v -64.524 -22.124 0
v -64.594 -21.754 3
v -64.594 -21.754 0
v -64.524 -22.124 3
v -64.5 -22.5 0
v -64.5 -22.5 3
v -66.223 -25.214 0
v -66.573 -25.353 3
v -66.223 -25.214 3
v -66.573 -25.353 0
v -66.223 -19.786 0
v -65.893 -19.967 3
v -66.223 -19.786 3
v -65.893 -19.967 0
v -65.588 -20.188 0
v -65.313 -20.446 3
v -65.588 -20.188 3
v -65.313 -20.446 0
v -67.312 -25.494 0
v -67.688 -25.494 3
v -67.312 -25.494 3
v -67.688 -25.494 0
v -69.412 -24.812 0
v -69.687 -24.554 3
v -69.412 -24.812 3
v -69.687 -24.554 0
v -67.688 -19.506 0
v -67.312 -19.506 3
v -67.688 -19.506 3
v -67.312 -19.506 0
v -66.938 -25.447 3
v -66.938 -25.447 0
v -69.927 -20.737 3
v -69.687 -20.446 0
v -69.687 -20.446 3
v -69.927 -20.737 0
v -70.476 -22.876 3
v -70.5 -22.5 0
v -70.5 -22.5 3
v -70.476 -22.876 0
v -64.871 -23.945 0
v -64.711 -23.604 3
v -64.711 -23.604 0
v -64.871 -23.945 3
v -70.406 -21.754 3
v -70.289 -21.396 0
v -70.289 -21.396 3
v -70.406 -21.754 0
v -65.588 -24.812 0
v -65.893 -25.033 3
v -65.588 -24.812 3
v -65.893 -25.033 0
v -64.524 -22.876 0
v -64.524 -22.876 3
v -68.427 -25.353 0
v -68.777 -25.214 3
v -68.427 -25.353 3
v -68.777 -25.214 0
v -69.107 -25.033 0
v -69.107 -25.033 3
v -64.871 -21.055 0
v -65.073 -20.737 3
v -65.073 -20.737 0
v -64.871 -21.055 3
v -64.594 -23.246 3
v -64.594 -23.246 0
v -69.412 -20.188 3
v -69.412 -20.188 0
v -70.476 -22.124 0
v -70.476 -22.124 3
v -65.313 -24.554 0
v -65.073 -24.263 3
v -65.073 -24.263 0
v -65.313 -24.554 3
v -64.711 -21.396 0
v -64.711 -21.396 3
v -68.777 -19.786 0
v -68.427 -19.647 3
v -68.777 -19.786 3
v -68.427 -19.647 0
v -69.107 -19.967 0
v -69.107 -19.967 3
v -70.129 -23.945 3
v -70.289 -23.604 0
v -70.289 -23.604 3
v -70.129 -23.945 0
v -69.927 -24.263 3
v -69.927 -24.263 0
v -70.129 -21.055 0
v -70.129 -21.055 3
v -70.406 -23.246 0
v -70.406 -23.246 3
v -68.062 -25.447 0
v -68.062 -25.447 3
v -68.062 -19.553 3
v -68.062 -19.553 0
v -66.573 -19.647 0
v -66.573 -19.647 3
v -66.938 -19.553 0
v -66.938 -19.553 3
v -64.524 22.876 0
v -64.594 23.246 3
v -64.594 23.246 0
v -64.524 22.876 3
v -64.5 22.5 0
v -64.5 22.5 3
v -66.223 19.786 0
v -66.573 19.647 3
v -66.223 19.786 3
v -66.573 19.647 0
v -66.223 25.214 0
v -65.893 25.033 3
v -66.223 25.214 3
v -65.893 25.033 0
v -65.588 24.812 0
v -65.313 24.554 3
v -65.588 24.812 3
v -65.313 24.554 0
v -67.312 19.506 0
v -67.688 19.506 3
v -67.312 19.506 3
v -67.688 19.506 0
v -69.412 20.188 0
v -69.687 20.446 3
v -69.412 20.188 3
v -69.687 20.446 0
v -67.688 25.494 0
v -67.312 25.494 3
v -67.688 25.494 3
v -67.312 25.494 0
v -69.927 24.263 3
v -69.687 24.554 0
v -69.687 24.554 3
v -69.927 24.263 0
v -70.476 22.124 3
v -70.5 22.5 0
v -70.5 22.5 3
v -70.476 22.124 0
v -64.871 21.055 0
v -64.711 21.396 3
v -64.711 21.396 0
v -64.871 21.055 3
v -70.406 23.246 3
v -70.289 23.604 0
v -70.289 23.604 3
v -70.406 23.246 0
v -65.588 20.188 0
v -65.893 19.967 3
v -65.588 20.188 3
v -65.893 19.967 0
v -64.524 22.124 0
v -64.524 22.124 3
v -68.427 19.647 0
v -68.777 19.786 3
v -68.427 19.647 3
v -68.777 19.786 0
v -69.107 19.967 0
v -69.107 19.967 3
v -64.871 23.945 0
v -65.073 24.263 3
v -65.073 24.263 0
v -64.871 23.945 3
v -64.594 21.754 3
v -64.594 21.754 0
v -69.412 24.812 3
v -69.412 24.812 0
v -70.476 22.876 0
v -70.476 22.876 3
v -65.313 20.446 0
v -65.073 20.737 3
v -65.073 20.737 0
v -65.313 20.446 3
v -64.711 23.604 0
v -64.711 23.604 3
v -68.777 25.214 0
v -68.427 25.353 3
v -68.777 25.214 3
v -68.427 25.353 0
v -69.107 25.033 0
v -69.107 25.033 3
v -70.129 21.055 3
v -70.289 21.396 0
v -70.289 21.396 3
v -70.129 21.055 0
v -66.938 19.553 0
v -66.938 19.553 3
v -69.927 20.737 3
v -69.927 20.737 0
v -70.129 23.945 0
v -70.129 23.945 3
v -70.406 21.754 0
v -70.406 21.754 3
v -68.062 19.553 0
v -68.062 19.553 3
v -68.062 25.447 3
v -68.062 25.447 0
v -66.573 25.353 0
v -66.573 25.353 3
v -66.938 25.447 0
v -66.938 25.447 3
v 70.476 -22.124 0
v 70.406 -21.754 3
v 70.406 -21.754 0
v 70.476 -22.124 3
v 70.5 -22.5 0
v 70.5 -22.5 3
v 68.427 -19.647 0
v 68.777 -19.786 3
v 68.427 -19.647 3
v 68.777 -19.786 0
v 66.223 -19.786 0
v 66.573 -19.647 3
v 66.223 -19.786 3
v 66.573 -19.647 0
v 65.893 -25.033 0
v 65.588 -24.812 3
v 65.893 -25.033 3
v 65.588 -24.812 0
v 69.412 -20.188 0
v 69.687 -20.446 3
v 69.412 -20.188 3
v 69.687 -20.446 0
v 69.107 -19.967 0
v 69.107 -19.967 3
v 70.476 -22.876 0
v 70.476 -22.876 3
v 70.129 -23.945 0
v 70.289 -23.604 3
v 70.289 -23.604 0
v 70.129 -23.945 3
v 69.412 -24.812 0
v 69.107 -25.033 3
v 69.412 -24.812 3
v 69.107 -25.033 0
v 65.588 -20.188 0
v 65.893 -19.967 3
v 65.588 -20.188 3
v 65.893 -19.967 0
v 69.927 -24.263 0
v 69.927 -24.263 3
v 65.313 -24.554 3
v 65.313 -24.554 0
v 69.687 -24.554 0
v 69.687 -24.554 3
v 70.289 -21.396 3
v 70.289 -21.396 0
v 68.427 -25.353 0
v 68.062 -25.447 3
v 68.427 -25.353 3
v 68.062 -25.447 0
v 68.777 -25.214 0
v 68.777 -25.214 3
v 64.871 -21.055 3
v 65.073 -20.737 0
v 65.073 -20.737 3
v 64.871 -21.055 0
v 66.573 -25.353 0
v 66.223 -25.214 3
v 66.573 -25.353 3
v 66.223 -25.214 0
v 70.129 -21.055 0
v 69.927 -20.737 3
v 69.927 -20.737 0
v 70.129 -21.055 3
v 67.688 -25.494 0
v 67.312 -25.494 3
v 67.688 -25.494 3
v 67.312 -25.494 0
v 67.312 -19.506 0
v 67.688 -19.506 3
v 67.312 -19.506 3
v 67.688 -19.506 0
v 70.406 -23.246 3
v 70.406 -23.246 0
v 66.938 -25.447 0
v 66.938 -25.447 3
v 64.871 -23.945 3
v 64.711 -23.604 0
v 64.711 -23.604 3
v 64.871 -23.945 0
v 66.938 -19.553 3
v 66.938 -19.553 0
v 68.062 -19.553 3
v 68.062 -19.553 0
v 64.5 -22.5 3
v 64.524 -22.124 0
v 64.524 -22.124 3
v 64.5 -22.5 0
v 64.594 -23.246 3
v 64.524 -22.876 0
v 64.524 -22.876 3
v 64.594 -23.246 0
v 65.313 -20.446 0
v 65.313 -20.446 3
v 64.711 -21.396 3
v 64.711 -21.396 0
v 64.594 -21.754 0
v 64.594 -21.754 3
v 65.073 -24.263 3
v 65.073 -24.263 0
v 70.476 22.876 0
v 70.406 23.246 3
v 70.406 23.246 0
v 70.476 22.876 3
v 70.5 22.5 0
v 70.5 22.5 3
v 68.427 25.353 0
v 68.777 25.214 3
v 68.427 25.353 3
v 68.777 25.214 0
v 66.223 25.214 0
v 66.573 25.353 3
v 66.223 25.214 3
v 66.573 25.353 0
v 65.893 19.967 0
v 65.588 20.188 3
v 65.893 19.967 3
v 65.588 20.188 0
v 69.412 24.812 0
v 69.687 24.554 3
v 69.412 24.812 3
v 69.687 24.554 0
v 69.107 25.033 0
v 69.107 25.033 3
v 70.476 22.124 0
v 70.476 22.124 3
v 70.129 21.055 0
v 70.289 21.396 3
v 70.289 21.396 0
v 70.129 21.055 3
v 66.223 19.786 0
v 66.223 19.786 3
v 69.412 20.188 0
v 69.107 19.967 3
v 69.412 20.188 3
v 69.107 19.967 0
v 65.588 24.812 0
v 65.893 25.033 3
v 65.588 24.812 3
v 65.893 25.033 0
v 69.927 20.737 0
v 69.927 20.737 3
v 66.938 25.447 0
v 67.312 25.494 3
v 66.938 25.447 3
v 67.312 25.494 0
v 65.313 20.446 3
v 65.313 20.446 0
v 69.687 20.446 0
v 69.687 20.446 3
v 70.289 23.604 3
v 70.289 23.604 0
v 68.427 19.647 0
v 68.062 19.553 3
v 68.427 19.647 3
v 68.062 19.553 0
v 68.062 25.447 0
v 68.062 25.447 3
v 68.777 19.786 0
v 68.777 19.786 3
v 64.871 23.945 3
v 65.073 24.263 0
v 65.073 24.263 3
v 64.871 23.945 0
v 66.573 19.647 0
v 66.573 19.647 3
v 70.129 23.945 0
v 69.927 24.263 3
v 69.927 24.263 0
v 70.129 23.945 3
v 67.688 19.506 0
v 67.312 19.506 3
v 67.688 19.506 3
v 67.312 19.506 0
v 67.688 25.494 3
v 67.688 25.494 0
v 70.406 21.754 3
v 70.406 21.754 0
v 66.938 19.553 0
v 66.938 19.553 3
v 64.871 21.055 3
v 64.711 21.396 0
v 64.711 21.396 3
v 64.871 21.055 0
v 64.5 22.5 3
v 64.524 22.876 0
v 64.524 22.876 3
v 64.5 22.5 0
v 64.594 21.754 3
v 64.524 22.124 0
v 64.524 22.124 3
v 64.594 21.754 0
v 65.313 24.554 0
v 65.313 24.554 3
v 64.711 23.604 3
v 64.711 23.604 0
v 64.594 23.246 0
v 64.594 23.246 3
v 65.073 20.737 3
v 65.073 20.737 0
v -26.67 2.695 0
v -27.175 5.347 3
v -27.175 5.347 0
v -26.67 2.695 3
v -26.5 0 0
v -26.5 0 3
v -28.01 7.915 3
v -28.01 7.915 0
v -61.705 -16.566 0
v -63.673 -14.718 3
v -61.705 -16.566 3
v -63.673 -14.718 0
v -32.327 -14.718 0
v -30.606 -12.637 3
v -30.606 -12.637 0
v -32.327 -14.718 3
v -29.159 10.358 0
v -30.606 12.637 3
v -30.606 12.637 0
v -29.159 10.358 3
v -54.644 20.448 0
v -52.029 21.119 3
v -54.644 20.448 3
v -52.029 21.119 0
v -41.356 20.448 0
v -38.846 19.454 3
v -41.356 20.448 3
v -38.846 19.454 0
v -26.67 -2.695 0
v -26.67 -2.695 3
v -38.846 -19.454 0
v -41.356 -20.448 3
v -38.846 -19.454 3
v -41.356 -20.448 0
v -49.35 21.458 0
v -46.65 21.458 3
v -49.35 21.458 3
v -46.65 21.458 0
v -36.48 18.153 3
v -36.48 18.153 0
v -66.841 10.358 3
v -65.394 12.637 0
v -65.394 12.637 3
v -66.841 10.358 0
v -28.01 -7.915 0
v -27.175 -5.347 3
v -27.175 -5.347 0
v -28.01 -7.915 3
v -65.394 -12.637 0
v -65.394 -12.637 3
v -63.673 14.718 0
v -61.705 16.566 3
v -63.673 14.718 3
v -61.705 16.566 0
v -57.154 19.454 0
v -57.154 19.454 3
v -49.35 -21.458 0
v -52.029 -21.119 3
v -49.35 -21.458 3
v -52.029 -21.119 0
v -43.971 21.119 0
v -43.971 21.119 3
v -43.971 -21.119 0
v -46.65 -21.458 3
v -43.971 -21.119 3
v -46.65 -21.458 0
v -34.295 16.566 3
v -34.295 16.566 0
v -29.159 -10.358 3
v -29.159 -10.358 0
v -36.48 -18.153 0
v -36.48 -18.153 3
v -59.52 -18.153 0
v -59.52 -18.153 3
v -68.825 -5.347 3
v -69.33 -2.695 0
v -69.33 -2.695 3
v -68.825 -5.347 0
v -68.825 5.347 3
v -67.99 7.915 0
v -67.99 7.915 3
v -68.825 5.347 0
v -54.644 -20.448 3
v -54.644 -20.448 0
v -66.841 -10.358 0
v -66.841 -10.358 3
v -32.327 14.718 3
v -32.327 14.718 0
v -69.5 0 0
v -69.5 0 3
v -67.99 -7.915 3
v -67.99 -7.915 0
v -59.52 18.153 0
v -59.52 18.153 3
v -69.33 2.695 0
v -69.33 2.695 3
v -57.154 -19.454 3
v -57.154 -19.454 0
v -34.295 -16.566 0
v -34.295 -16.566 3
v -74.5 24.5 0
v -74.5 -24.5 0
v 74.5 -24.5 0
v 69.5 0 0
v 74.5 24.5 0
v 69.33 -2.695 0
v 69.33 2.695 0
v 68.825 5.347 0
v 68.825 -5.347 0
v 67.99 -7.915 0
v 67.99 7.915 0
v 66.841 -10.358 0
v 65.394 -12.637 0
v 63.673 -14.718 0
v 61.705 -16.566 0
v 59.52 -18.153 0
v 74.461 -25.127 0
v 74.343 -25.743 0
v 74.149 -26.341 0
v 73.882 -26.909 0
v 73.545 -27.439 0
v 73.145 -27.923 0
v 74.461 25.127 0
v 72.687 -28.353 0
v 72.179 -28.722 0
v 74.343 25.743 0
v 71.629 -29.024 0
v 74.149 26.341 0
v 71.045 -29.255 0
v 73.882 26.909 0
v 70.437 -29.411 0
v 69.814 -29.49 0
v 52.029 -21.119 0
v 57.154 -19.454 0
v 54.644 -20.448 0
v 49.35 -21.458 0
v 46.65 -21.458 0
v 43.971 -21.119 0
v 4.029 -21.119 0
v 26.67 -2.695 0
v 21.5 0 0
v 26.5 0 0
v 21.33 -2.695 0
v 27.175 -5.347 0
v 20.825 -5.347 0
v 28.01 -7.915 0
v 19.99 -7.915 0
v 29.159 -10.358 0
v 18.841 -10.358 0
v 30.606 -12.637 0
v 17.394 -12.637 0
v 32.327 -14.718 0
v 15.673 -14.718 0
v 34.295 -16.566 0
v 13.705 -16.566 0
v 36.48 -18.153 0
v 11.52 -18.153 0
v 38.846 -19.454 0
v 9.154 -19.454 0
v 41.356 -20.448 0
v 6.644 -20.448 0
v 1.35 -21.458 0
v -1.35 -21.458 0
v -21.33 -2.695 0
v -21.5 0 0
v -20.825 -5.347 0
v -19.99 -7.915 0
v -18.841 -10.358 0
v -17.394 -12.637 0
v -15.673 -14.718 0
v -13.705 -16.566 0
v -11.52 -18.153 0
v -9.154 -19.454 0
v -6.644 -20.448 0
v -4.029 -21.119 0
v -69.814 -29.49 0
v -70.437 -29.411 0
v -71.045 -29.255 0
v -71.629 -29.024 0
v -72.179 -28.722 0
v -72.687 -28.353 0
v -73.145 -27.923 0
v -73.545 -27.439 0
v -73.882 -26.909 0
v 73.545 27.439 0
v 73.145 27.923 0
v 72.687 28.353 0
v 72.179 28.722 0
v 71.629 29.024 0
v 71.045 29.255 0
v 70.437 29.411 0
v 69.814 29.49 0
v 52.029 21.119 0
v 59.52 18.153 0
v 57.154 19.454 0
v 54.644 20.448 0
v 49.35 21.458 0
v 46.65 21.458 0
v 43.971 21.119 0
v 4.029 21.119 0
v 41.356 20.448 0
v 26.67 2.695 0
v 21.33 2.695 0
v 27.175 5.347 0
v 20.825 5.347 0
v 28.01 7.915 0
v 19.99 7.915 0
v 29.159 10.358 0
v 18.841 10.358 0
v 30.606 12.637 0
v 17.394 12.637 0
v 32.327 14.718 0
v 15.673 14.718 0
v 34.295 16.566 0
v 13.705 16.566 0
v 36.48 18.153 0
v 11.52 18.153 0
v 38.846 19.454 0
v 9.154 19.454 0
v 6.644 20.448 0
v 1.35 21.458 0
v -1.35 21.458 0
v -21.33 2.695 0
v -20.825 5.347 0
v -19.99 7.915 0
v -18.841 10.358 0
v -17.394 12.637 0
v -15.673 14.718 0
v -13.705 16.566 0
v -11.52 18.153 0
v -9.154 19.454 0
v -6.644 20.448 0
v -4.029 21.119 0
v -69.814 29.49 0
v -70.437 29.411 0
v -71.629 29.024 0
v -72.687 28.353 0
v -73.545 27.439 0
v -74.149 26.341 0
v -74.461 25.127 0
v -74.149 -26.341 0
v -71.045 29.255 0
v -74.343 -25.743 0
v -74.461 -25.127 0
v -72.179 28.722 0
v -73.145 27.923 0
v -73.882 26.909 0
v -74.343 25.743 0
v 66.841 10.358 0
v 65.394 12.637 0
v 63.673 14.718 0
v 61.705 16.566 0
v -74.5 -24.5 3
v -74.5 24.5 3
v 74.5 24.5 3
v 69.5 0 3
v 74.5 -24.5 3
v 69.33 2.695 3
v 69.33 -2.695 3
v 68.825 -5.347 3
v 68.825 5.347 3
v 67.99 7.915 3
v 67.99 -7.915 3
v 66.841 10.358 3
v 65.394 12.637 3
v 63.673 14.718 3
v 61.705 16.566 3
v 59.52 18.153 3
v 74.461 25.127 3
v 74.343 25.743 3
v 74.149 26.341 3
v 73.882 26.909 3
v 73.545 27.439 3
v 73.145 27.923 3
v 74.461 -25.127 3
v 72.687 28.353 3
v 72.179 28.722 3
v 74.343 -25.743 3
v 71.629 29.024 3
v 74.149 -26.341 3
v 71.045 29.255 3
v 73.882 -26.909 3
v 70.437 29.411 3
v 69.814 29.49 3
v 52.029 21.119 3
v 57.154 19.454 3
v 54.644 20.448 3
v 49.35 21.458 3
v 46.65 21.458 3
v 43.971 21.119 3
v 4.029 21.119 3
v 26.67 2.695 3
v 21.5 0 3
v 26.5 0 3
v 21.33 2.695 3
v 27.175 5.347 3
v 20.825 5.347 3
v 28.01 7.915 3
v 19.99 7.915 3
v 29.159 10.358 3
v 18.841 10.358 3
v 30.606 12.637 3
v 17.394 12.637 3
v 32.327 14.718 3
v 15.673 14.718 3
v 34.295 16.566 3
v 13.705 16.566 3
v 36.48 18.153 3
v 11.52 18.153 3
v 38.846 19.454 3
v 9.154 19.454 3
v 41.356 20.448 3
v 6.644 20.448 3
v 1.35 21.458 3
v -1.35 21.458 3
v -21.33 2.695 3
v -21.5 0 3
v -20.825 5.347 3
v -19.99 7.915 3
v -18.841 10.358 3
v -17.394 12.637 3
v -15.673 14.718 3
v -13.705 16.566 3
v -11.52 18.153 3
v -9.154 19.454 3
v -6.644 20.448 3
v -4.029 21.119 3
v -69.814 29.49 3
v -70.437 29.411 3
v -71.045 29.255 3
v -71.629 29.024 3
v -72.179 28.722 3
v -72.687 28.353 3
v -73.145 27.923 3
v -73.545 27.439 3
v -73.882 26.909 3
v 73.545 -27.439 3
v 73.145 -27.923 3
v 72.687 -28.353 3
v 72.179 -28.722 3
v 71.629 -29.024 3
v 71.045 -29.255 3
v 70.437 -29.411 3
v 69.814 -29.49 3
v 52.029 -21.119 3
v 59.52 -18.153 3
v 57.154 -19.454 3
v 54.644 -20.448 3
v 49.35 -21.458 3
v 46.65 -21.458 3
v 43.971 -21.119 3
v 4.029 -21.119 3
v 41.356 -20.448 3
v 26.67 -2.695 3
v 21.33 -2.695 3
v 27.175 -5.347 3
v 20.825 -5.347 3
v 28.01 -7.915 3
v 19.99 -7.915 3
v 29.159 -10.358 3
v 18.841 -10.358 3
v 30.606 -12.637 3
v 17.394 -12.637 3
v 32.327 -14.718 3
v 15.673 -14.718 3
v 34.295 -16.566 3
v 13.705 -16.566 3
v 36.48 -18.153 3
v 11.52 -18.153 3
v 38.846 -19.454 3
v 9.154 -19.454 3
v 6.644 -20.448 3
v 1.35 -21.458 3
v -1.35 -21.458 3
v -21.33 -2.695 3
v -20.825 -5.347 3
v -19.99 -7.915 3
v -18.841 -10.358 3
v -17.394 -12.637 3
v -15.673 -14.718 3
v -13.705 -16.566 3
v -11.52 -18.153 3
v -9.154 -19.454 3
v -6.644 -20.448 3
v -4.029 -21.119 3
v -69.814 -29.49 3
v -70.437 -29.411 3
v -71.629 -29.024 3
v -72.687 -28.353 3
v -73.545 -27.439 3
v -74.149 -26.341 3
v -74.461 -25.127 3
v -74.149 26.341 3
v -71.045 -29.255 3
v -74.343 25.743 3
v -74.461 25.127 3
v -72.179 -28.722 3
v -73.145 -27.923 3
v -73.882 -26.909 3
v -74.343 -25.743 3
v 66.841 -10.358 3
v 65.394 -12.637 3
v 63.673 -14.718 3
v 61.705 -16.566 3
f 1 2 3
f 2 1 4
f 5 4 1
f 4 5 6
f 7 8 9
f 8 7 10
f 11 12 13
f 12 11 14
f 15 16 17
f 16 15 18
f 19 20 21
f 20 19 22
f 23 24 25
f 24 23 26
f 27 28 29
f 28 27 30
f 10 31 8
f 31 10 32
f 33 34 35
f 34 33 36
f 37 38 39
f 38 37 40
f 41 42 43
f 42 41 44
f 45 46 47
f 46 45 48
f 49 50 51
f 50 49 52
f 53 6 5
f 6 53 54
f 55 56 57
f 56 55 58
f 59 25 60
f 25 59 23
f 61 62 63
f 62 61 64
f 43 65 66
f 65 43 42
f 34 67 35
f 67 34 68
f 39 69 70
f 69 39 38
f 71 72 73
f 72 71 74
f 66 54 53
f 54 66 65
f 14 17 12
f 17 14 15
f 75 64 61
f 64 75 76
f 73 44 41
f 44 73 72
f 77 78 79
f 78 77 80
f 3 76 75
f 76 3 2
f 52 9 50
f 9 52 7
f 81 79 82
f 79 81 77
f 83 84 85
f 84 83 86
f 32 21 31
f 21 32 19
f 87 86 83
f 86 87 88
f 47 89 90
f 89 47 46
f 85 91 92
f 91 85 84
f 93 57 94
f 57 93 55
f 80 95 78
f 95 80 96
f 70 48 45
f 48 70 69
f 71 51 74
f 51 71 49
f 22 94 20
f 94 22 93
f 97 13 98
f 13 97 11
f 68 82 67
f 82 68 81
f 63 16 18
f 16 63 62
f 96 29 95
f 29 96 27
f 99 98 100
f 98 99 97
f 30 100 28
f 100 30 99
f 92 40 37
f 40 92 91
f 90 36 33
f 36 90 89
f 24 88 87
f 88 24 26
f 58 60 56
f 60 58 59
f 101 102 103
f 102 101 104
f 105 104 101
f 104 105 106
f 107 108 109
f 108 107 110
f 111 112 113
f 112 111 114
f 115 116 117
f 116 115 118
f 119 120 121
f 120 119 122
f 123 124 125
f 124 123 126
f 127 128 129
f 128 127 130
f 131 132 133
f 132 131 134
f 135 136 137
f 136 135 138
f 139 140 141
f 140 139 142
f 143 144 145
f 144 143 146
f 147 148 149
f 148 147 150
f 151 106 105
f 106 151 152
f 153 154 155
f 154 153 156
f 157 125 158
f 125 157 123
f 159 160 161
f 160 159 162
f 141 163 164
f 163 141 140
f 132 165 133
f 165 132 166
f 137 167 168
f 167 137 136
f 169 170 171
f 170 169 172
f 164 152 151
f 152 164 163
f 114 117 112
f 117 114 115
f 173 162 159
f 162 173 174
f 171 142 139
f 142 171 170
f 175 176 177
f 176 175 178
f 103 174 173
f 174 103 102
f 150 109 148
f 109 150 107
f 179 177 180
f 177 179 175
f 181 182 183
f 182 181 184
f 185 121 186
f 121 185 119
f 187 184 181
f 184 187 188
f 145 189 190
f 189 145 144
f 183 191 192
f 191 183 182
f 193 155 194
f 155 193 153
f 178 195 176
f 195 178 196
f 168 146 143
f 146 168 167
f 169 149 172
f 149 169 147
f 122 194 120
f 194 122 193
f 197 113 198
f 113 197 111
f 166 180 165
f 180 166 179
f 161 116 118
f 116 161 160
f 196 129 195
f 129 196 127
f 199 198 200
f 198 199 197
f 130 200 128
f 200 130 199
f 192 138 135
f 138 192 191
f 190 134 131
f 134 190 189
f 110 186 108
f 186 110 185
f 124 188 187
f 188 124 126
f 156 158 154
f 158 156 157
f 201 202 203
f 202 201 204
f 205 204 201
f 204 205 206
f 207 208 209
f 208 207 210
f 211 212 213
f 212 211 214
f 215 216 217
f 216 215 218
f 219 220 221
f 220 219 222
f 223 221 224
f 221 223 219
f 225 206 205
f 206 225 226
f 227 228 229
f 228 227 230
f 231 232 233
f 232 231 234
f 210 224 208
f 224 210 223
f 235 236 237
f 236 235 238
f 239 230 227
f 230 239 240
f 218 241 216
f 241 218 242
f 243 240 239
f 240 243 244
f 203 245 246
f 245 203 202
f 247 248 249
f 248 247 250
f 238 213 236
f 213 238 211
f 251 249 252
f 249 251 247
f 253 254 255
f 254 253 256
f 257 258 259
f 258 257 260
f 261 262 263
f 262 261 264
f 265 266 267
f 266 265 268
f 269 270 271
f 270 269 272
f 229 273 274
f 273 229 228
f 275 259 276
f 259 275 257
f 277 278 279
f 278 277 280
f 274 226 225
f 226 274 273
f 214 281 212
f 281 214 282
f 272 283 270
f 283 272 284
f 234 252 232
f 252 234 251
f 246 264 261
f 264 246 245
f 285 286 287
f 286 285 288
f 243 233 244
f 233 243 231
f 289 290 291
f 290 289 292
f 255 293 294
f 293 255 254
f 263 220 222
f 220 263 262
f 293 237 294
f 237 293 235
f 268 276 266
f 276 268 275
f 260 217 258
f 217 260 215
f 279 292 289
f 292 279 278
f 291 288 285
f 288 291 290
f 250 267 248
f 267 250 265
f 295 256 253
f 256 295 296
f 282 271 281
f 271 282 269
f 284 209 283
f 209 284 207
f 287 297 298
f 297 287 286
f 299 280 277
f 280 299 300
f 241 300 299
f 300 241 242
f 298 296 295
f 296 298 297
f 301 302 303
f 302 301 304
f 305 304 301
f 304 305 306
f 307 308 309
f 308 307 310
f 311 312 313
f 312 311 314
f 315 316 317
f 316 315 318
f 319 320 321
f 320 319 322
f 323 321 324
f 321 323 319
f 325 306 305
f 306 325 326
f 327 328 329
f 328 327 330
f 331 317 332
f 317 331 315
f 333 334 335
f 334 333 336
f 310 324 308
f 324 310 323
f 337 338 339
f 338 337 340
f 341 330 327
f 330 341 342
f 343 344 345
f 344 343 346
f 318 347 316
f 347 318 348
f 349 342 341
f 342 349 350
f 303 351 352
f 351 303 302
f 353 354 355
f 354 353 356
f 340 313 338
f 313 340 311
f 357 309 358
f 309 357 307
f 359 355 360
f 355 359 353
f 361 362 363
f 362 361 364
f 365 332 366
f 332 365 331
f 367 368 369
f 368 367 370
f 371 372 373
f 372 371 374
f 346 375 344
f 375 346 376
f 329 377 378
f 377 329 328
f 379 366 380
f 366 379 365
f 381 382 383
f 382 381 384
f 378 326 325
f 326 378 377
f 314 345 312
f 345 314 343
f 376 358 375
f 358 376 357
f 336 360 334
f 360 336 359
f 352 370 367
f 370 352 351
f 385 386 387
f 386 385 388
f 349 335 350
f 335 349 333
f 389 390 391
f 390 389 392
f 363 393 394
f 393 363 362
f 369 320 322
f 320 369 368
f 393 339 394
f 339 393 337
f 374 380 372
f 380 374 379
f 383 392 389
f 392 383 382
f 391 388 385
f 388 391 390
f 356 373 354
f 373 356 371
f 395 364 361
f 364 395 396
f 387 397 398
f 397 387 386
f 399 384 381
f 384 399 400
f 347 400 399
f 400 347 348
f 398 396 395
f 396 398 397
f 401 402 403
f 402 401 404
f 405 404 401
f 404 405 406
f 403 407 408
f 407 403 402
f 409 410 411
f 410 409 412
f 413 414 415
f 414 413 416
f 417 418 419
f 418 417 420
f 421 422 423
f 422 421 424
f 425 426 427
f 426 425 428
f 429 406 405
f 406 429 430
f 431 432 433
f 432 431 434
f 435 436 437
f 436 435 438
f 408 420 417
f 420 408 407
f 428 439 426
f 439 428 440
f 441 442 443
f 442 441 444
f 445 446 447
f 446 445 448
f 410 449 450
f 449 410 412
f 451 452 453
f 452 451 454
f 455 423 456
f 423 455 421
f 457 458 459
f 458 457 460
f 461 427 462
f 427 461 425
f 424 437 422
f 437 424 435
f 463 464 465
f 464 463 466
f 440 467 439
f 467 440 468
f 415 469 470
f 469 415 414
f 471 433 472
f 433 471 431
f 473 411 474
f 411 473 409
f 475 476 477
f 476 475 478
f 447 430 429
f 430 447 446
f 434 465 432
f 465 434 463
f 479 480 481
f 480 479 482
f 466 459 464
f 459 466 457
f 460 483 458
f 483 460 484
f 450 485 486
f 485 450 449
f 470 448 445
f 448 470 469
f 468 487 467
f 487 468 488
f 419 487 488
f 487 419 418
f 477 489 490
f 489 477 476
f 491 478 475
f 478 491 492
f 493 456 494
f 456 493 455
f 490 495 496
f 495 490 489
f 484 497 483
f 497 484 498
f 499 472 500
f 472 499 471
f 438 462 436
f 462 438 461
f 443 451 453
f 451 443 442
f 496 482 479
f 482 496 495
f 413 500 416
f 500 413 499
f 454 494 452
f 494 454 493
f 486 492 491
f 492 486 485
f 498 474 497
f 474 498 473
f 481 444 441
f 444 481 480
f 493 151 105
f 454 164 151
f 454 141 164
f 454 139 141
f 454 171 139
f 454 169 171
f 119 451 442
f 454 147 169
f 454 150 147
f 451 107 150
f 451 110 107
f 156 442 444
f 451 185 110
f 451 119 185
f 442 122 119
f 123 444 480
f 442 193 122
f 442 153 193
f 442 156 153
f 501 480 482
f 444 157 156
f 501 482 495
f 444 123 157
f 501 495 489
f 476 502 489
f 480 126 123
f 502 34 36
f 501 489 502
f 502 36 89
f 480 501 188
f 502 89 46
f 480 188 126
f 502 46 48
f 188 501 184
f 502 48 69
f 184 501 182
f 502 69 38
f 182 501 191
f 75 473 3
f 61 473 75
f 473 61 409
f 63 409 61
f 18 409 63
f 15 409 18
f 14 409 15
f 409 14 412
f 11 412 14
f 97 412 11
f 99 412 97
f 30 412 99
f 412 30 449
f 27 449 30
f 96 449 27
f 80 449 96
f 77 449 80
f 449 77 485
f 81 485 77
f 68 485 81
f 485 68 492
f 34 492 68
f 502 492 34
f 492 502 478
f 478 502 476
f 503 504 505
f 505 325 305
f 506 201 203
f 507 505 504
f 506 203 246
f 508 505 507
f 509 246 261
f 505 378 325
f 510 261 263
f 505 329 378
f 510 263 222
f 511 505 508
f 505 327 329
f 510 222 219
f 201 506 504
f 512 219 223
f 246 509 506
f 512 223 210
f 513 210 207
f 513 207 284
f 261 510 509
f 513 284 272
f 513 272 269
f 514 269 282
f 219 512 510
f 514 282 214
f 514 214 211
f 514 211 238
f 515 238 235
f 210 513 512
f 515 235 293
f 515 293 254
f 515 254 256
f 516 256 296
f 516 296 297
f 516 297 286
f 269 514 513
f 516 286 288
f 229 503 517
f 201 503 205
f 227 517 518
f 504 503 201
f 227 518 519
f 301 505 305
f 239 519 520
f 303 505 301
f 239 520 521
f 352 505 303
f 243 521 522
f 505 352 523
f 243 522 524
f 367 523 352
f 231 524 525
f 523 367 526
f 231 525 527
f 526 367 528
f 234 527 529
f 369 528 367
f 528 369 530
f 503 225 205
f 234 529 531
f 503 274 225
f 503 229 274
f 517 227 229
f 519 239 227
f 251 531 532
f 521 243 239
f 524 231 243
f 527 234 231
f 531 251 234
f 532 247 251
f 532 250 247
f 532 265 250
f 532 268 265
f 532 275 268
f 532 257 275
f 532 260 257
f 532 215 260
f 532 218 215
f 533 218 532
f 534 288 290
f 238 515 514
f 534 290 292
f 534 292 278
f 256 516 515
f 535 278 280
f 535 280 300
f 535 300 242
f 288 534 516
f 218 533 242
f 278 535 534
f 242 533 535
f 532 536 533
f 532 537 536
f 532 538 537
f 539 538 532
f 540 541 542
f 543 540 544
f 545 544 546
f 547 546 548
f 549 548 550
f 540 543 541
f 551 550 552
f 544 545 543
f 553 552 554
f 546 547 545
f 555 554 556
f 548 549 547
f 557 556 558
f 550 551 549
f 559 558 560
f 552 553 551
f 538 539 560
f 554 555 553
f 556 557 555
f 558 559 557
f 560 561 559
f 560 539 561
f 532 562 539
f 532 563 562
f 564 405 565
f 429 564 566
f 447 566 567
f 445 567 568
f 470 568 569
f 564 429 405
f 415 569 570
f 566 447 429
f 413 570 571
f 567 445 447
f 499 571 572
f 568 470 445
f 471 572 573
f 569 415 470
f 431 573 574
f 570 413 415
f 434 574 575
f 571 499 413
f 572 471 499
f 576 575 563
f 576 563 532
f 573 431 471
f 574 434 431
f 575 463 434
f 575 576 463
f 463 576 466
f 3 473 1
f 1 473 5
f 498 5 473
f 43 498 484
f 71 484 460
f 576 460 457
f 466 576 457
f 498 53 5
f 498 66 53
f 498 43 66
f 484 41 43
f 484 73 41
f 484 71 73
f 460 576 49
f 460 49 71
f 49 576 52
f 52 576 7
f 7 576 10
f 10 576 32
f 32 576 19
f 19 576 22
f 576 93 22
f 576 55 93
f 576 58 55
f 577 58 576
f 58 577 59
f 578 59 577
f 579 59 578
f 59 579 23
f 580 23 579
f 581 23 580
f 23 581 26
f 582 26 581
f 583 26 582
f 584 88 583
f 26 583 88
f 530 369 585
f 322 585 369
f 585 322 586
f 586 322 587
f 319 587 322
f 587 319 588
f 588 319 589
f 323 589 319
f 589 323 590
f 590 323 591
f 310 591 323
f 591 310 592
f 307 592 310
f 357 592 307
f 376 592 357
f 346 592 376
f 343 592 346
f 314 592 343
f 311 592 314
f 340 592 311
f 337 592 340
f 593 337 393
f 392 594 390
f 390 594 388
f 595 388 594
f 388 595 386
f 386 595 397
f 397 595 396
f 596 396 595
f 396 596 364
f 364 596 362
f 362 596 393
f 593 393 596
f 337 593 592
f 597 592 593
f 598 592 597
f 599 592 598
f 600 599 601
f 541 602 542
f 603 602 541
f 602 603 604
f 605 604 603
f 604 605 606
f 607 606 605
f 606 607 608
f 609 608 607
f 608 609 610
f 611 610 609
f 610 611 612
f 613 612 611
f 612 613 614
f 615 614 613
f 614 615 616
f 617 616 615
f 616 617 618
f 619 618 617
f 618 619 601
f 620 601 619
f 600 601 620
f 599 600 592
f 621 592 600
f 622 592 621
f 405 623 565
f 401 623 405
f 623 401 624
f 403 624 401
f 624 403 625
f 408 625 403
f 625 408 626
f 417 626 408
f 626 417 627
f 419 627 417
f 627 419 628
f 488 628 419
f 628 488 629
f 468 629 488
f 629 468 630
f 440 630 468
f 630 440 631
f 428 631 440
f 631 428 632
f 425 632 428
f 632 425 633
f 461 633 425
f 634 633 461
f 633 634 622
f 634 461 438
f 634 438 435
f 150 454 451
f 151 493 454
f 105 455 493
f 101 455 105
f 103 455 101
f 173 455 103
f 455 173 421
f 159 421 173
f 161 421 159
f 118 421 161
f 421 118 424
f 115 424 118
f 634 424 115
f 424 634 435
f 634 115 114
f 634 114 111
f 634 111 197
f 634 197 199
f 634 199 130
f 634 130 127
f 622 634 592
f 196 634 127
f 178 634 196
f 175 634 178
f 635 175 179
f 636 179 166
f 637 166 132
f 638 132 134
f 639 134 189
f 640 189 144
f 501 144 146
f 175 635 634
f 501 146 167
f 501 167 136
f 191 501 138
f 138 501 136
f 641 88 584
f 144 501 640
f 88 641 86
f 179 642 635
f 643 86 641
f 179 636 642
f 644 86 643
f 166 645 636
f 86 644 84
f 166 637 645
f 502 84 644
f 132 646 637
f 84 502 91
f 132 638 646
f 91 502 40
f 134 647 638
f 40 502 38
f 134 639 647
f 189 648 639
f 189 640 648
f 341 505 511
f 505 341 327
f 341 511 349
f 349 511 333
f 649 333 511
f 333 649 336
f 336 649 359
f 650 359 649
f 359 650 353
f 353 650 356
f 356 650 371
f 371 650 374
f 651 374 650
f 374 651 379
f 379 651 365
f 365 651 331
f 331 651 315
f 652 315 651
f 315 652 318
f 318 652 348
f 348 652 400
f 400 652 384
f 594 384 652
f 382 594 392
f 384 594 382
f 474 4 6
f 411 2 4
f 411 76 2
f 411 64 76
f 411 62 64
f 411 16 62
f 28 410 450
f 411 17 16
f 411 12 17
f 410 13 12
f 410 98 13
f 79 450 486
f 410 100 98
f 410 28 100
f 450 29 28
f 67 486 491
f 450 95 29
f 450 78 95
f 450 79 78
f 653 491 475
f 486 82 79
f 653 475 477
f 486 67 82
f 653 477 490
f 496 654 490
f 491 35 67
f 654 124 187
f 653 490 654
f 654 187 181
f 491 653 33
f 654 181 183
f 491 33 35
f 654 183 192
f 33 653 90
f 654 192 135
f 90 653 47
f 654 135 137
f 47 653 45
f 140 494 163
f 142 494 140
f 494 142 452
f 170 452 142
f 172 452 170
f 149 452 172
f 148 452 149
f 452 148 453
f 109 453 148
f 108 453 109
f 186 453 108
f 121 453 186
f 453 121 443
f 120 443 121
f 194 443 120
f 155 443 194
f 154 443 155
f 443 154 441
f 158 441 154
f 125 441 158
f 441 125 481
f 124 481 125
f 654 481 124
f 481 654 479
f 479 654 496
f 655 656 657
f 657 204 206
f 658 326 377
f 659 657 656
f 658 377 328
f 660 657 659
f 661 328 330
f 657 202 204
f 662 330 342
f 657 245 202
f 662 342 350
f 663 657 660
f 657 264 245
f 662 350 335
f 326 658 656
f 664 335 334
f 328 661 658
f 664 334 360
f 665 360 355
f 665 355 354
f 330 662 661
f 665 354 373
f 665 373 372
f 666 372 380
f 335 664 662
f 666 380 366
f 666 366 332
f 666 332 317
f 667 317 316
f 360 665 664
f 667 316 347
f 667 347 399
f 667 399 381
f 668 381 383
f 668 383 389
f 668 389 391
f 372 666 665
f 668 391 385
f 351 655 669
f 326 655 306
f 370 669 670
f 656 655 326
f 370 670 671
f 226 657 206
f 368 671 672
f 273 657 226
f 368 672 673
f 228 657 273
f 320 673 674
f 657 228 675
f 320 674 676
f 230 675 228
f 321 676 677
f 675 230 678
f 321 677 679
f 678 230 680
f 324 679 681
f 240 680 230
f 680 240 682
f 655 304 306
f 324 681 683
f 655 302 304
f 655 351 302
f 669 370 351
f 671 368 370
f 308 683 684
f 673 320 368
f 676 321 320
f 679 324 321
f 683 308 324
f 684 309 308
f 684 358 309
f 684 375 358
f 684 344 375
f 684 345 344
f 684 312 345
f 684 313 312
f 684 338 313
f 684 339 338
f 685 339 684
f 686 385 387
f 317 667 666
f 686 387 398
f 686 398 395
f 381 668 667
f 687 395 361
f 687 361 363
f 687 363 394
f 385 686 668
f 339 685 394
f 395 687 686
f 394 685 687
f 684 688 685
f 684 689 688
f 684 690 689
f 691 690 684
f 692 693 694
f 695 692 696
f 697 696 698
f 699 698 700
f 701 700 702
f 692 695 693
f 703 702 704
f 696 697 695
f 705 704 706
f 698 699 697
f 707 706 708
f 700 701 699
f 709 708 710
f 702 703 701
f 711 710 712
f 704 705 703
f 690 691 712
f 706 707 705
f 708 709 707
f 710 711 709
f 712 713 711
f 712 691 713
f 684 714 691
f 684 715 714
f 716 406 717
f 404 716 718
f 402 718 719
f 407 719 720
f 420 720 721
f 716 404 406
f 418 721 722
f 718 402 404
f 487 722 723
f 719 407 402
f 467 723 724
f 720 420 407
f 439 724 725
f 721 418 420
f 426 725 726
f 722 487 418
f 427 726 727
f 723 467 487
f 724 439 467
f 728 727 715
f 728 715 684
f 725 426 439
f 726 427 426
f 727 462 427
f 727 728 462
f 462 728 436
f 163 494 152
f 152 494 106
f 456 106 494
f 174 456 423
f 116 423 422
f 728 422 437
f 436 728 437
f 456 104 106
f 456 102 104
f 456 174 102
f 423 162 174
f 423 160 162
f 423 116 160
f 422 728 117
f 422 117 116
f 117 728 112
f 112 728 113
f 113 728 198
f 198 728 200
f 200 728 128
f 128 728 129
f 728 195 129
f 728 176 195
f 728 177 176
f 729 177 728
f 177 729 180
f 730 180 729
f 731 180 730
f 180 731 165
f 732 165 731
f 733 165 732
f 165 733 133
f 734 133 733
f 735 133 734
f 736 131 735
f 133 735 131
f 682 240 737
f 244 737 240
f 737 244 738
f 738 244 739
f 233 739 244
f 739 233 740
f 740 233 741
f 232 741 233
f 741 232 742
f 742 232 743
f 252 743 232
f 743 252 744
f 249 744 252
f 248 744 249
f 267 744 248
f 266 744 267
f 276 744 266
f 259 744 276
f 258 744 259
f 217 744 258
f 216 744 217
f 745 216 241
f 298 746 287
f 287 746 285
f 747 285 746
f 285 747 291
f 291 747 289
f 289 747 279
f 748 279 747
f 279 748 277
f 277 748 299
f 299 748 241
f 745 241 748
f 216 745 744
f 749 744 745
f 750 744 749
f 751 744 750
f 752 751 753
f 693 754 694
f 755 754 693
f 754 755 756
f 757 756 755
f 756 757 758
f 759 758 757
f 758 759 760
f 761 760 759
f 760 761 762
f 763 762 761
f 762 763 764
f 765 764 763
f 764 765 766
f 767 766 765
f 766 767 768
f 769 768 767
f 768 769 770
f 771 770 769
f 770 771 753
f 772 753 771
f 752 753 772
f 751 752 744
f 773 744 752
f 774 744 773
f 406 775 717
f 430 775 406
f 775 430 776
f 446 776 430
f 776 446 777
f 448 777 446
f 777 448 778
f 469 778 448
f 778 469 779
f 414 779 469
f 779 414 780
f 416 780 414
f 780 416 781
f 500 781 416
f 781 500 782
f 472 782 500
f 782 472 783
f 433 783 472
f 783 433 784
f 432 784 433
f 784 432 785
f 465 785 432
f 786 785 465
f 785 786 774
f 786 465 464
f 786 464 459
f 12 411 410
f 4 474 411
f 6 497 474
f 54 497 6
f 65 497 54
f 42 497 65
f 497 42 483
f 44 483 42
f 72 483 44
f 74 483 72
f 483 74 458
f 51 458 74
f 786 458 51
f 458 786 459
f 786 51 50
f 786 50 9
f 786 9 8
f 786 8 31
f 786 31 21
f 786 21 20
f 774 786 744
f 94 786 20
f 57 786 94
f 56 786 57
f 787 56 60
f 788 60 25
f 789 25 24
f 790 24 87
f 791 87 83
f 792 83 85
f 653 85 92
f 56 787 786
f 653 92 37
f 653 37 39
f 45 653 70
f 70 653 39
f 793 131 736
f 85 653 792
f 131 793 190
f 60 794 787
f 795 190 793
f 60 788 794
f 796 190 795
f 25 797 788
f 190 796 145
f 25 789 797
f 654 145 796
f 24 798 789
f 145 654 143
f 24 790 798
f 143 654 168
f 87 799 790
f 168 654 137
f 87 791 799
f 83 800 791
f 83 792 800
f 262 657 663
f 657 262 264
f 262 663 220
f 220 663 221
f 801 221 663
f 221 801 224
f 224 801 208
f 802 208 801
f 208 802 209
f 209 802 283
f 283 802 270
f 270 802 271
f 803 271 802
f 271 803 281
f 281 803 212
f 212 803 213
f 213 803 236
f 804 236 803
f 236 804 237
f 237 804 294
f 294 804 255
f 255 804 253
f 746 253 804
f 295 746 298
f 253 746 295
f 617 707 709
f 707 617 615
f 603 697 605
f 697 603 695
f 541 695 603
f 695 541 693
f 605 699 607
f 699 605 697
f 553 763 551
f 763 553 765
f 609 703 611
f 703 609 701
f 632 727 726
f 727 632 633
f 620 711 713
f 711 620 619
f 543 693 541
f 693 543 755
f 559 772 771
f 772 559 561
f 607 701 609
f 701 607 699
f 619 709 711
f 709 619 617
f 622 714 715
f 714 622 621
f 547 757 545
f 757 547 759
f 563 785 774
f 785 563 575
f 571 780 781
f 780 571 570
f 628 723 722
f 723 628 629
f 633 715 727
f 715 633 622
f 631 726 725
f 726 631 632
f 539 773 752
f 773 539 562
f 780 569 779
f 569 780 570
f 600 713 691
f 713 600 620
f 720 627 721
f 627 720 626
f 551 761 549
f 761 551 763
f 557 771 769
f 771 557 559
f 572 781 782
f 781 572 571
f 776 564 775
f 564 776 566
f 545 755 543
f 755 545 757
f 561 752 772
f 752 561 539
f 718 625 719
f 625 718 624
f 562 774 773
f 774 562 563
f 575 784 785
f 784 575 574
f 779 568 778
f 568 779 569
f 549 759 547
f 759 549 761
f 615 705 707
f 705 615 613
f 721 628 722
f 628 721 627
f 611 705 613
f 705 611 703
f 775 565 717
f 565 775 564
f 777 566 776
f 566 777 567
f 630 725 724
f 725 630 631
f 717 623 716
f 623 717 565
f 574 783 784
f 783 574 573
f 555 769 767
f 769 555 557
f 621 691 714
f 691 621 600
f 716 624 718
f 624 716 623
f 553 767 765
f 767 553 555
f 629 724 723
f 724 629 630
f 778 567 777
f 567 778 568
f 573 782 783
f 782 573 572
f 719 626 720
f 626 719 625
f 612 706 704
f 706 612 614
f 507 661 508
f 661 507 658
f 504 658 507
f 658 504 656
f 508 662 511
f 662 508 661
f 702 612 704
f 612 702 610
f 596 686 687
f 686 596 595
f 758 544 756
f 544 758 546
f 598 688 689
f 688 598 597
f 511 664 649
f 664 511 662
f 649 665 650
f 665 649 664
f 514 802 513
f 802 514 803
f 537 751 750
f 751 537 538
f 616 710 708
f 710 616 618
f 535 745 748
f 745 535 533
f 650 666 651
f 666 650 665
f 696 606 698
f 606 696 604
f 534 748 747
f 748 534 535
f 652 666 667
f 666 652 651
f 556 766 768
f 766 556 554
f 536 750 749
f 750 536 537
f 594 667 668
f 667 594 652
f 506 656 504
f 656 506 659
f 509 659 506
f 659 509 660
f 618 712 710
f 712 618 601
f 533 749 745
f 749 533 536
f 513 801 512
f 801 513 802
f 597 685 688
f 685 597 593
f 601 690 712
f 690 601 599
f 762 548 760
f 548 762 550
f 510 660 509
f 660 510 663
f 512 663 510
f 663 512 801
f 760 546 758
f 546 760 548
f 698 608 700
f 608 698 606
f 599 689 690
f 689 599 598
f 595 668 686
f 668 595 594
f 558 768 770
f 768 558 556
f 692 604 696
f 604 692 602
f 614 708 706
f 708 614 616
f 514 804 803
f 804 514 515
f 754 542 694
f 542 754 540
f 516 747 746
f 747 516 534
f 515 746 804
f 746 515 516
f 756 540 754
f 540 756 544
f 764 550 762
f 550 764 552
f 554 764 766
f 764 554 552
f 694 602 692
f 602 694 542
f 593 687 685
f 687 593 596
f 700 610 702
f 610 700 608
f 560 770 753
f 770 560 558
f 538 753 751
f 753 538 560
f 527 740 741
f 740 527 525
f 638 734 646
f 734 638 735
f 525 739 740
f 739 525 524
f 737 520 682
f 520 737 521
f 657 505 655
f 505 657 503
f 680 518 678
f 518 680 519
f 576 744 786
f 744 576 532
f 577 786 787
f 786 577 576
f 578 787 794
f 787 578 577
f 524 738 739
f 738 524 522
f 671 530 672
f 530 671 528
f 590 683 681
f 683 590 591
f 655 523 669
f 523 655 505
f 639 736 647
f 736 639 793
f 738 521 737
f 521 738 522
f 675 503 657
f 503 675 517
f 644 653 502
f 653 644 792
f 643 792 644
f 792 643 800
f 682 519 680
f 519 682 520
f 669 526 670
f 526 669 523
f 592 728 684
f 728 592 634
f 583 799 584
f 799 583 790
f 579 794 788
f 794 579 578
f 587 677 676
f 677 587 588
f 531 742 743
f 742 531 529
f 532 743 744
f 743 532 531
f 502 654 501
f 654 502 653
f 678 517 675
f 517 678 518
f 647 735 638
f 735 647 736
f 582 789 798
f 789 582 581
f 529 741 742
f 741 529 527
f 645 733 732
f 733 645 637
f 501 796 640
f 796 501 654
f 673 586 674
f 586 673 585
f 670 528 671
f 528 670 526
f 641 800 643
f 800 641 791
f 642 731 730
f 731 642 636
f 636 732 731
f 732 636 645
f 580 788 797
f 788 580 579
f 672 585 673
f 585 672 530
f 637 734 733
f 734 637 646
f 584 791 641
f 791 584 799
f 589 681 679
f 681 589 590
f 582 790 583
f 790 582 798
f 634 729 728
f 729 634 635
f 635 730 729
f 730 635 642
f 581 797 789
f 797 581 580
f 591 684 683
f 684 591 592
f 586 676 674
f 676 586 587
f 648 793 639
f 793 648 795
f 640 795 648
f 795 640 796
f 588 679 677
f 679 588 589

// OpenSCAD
$fn = 50;


difference() {
	union() {
		hull() {
			translate(v = [-69.5000000000, 24.5000000000, 0]) {
				cylinder(h = 3, r = 5);
			}
			translate(v = [69.5000000000, 24.5000000000, 0]) {
				cylinder(h = 3, r = 5);
			}
			translate(v = [-69.5000000000, -24.5000000000, 0]) {
				cylinder(h = 3, r = 5);
			}
			translate(v = [69.5000000000, -24.5000000000, 0]) {
				cylinder(h = 3, r = 5);
			}
		}
	}
	union() {
		#translate(v = [-67.5000000000, -22.5000000000, -100.0000000000]) {
			cylinder(h = 200, r = 3.0000000000);
		}
		#translate(v = [-67.5000000000, 22.5000000000, -100.0000000000]) {
			cylinder(h = 200, r = 3.0000000000);
		}
		#translate(v = [67.5000000000, -22.5000000000, -100.0000000000]) {
			cylinder(h = 200, r = 3.0000000000);
		}
		#translate(v = [67.5000000000, 22.5000000000, -100.0000000000]) {
			cylinder(h = 200, r = 3.0000000000);
		}
		#translate(v = [-48.0000000000, 0, 0]) {
			cylinder(h = 3, r = 21.5000000000);
		}
		#cylinder(h = 3, r = 21.5000000000);
		#translate(v = [48.0000000000, 0, 0]) {
			cylinder(h = 3, r = 21.5000000000);
		}
	}
}
